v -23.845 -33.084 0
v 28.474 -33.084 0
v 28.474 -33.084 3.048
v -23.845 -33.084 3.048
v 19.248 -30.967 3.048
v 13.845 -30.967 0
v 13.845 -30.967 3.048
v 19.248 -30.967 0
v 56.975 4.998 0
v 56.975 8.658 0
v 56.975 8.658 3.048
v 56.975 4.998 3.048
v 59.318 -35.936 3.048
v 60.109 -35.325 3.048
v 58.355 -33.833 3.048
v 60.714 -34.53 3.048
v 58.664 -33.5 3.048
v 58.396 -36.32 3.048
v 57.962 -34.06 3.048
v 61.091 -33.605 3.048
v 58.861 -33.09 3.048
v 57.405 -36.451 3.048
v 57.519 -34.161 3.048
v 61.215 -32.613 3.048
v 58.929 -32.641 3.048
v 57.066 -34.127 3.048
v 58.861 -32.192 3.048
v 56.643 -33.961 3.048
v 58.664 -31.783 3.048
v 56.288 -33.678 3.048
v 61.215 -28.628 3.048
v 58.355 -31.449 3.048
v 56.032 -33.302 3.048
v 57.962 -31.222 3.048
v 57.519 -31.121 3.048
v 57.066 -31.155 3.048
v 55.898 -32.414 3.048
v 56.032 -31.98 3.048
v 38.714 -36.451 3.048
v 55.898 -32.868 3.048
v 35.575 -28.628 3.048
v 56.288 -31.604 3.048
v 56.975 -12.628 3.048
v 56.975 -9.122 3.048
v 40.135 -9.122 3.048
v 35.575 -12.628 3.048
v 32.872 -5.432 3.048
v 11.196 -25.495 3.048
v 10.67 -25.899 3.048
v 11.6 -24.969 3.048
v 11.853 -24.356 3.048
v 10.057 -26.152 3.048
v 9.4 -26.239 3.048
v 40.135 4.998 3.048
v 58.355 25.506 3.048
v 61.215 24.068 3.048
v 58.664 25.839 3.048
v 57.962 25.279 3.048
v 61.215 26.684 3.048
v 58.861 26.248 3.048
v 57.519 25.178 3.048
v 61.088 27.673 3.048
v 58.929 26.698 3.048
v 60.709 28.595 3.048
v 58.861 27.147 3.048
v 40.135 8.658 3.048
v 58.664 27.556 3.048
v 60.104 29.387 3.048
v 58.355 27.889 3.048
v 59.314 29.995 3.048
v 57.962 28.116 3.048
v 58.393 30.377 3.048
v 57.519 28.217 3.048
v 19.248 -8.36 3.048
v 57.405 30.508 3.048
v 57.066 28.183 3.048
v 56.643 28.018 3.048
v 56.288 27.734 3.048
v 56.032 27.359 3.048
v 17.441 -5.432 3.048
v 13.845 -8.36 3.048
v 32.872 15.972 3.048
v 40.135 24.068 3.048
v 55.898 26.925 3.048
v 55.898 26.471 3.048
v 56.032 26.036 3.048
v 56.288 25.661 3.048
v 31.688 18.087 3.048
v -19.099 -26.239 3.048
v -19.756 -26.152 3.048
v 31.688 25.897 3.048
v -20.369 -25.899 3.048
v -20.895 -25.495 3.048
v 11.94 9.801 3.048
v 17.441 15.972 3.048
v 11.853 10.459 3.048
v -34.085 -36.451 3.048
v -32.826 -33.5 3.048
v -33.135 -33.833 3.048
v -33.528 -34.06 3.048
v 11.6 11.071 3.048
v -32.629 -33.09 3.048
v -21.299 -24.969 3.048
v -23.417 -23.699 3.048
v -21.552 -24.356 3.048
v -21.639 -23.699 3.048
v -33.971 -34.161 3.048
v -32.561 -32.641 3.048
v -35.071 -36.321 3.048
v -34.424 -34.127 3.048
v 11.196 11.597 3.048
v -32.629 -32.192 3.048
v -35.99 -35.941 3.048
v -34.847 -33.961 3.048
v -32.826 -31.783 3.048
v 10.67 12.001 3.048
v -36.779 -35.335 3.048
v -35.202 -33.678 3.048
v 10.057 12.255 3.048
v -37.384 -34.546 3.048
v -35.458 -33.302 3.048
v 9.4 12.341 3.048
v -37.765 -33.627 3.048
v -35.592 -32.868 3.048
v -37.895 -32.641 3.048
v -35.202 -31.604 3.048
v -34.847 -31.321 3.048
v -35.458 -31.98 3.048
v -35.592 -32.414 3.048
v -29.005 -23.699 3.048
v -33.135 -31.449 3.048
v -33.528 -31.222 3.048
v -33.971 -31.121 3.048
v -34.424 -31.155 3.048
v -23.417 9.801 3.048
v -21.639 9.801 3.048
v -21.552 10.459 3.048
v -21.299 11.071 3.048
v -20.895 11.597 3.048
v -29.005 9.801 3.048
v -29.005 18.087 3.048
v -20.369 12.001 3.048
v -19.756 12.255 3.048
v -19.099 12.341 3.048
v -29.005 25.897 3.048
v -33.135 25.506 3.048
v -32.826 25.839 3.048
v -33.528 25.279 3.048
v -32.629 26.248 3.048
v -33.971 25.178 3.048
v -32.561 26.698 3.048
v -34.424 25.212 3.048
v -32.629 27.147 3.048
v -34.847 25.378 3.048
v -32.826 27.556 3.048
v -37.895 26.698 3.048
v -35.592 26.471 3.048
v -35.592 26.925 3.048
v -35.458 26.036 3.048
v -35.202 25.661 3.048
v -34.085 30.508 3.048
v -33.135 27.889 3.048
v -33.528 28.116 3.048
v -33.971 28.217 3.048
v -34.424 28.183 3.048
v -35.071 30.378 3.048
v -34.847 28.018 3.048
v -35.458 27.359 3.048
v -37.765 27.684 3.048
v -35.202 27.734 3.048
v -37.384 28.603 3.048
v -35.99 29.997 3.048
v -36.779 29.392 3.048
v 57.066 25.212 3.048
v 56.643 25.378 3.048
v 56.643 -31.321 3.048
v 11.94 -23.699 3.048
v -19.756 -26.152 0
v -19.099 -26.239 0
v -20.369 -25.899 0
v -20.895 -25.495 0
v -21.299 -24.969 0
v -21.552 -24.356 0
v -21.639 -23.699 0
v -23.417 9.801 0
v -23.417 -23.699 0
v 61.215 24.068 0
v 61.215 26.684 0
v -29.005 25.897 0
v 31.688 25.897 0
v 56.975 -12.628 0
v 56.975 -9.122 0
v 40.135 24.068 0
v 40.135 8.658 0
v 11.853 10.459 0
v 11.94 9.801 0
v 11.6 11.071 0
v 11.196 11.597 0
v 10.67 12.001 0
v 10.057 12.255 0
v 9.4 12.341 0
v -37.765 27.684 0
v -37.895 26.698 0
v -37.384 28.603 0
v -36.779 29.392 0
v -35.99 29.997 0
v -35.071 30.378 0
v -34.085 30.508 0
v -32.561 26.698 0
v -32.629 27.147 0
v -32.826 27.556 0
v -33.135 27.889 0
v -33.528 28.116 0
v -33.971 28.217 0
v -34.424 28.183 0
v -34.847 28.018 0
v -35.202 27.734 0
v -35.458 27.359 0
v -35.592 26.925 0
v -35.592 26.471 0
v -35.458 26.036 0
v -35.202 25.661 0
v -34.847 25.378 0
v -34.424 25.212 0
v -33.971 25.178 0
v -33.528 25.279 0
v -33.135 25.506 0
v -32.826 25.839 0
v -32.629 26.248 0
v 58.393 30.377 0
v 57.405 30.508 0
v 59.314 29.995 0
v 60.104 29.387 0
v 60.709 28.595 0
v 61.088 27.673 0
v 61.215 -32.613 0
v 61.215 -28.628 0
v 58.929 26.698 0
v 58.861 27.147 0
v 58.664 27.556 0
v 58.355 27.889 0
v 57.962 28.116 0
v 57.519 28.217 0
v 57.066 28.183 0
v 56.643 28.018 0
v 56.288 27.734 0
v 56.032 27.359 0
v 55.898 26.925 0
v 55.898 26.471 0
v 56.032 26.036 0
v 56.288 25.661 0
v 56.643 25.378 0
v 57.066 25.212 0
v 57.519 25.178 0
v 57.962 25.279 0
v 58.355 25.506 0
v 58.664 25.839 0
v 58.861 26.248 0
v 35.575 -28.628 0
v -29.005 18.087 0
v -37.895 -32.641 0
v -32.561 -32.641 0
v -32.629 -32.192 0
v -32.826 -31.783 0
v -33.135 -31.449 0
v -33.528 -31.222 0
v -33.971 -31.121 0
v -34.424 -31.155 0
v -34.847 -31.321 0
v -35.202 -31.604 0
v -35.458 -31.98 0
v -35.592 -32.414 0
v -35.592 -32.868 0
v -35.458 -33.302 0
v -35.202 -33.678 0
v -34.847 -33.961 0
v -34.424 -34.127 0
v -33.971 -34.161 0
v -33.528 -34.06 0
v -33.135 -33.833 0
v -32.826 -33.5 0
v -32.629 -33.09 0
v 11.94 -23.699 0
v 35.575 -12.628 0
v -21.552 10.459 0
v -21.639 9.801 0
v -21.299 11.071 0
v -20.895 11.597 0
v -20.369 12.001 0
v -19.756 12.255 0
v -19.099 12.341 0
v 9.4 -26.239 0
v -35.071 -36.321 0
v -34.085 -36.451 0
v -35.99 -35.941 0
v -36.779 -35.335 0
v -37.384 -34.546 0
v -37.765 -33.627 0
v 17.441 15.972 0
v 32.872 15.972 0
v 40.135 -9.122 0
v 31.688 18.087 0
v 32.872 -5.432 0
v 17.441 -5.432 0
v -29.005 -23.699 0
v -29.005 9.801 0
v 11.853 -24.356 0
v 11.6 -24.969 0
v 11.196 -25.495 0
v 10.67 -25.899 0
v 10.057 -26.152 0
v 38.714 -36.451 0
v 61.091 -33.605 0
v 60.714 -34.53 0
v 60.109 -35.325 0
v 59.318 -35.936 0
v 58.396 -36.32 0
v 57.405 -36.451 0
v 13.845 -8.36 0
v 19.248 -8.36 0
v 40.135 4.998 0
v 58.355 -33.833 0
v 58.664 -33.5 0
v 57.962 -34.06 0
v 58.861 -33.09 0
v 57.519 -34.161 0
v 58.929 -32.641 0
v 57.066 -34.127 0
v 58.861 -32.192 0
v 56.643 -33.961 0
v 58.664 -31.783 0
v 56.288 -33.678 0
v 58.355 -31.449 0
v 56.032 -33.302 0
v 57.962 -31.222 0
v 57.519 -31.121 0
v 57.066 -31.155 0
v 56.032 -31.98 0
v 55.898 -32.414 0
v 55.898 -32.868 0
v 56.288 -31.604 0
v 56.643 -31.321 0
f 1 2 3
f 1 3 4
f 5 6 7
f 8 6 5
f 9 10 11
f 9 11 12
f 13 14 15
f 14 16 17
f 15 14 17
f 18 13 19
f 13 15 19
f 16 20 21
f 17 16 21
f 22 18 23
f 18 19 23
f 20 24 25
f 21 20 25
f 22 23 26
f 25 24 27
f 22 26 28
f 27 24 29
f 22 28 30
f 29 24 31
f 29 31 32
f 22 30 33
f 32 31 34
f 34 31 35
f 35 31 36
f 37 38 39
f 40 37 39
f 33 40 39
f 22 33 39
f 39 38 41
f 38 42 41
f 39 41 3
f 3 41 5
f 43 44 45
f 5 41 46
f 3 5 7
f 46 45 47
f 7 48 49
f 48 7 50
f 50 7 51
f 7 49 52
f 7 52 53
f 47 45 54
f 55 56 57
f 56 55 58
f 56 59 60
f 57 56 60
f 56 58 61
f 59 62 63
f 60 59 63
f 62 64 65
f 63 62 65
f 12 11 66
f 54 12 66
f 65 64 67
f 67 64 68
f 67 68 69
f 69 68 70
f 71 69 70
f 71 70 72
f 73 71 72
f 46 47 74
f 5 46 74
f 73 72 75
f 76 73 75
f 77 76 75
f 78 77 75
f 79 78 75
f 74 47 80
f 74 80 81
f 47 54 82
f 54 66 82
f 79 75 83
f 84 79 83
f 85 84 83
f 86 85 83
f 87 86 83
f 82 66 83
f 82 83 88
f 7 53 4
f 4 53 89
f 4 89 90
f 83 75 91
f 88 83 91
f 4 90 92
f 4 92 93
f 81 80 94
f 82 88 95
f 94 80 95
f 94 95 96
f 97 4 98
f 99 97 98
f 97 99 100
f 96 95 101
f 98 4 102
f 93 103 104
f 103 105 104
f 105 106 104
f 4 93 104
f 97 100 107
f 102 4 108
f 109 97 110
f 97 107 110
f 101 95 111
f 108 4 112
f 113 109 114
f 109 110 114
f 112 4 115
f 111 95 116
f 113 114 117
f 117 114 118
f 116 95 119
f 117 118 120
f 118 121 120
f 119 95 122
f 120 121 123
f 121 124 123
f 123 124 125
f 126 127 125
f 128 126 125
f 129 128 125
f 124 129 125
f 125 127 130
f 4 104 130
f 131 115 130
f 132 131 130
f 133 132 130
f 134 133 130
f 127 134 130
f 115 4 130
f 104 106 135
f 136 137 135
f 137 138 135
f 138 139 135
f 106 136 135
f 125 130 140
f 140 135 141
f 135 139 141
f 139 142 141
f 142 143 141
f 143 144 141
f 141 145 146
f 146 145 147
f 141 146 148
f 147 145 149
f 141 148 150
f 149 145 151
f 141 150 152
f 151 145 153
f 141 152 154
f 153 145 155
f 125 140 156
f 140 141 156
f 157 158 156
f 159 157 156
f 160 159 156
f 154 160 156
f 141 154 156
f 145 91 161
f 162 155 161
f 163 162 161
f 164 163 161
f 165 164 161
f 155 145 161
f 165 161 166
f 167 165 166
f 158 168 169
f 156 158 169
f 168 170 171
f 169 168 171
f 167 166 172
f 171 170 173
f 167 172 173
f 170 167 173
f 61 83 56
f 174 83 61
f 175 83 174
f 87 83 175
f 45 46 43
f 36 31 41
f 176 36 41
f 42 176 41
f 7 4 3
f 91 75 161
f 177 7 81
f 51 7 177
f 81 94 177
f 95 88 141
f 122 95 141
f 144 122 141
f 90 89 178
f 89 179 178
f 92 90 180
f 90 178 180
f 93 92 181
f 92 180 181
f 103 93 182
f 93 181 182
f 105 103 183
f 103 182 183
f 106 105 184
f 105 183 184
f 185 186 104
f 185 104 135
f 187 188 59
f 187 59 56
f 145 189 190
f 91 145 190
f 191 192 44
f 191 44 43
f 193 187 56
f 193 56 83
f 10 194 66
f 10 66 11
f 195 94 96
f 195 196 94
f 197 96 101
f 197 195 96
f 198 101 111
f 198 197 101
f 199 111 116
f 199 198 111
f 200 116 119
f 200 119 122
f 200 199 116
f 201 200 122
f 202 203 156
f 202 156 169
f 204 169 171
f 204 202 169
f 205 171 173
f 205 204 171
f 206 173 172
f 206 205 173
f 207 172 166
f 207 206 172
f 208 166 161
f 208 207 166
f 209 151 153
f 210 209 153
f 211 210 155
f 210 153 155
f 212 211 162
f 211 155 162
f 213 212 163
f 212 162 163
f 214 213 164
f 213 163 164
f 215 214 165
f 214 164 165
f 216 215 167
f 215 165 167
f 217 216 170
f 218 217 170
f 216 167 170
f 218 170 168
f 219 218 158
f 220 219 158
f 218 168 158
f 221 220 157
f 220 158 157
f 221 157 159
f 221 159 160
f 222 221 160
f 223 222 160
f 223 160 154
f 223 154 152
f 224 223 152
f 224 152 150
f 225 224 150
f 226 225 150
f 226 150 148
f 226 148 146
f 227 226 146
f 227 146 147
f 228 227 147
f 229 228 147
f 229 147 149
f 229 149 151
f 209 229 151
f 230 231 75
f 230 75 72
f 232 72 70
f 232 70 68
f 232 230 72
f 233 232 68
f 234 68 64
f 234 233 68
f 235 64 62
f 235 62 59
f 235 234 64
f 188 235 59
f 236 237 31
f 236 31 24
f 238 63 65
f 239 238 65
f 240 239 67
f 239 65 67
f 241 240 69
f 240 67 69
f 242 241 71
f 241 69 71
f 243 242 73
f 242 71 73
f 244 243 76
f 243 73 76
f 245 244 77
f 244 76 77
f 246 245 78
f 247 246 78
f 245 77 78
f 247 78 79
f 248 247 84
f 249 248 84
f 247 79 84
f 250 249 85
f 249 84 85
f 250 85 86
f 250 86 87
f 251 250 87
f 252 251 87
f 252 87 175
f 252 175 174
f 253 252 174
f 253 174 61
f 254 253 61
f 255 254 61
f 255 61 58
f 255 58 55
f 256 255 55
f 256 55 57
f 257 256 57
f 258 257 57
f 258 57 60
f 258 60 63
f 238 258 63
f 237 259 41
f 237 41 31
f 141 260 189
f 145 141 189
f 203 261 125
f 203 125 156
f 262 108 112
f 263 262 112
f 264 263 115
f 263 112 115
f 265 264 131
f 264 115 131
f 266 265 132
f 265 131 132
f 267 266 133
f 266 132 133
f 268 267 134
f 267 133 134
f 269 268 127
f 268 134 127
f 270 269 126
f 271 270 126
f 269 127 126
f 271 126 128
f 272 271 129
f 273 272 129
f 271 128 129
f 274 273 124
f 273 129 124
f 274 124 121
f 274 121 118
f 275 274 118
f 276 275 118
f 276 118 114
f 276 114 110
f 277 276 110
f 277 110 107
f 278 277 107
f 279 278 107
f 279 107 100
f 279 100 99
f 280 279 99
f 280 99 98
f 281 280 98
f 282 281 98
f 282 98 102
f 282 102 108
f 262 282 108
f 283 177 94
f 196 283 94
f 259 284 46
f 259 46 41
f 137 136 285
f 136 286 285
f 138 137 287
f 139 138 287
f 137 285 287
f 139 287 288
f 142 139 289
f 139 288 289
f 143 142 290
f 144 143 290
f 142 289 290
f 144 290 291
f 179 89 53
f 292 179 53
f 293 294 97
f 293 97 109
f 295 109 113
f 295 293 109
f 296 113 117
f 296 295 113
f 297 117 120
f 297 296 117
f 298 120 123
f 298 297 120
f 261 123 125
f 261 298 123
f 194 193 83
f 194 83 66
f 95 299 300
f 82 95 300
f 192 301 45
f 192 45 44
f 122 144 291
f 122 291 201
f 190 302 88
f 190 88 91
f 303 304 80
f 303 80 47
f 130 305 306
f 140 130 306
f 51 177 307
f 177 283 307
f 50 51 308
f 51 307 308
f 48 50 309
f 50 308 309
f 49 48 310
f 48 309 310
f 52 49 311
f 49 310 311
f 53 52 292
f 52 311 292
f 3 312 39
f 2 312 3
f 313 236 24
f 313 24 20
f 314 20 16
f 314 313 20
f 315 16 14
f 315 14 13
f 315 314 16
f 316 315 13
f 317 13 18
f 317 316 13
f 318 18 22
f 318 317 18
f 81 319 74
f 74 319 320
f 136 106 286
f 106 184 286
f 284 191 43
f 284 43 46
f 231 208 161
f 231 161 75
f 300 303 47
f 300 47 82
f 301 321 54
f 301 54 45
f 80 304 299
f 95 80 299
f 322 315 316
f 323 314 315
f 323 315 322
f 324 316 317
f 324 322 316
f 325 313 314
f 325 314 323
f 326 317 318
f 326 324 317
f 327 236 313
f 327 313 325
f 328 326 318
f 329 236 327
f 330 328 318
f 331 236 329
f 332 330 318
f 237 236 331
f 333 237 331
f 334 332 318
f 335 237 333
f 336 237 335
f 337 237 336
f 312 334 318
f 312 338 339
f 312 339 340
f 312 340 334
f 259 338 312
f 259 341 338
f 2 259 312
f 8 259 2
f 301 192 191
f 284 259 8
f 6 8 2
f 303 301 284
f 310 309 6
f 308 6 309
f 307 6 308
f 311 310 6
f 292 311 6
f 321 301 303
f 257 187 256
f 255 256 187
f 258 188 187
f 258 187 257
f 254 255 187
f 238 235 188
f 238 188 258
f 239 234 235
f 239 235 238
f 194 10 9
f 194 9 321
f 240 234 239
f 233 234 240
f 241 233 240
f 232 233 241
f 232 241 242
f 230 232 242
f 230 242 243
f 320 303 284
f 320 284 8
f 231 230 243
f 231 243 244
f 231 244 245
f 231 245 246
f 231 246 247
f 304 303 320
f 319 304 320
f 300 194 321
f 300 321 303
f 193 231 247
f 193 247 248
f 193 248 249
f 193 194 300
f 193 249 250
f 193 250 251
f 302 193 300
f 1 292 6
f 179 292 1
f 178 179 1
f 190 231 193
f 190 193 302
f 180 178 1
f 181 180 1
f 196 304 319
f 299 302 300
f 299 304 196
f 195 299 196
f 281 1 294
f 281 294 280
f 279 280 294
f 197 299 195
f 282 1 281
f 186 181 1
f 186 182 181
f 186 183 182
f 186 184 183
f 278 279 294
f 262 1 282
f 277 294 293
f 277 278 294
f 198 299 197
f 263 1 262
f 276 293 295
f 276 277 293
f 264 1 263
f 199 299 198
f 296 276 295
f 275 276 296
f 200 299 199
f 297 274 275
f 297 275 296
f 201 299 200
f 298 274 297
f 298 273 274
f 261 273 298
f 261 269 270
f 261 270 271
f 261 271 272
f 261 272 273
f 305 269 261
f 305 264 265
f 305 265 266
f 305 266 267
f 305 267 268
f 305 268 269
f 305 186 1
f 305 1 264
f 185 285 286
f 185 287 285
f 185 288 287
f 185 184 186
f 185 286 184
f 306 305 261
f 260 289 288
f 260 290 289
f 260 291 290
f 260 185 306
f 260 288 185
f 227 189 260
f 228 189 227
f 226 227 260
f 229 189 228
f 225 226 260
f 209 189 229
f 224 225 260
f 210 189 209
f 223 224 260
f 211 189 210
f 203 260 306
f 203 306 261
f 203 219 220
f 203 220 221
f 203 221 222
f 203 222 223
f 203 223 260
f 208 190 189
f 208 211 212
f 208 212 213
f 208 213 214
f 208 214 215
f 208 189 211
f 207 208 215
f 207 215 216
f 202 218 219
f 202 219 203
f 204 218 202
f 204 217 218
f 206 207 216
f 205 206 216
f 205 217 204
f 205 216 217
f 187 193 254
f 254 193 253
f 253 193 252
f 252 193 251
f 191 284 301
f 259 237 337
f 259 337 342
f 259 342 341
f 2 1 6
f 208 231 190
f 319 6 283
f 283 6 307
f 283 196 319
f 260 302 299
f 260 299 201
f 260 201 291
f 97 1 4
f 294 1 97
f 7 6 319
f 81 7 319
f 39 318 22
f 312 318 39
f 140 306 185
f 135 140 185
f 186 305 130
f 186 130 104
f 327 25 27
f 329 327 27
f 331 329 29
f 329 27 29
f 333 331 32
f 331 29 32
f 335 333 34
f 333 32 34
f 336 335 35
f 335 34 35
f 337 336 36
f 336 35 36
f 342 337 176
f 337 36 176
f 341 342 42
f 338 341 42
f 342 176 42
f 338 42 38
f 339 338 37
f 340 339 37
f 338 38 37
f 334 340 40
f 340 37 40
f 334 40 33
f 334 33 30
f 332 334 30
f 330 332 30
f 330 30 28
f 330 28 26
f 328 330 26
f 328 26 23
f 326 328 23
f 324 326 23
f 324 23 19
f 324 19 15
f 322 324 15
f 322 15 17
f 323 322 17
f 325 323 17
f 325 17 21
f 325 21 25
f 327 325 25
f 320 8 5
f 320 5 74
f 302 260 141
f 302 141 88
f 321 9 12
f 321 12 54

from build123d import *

# Parameters (mm, degrees)
SKETCH1_R           = 1.3462
SKETCH1_W           = 5.4034
SKETCH1_H           = 22.6066
SKETCH1_W_2         = 60.6932
SKETCH1_H_2         = 7.81
SKETCH1_W_3         = 15.431
SKETCH1_H_3         = 21.4039
SKETCH1_W_4         = 31.9679
SKETCH1_H_4         = 18.2371
SKETCH1_W_5         = 5.588
SKETCH1_H_5         = 33.5001
BOSS_EXTRUDE1_DEPTH = 3.048
SKETCH2_W           = 33.5789
SKETCH2_H           = 38.5801
CUT_EXTRUDE1_DEPTH  = 4.048
FILLET1_R           = 2.54
SKETCH3_R           = 1.524
CUT_EXTRUDE2_DEPTH  = 4.048


with BuildPart() as part:
    # Sketch1 → Boss-Extrude1 (new body)
    with BuildSketch(Plane.XY):
        with BuildLine():
            Line((61.214907375, 24.068294304), (40.134807375, 24.068294304))
            Line((40.134807375, 24.068294304), (40.134807375, 8.658194304))
            Line((40.134807375, 8.658194304), (56.975007375, 8.658194304))
            Line((56.975007375, 8.658194304), (56.975007375, 4.997894304))
            Line((56.975007375, 4.997894304), (40.134807375, 4.997894304))
            Line((40.134807375, 4.997894304), (40.134807375, -9.121805696))
            Line((40.134807375, -9.121805696), (56.975007375, -9.121805696))
            Line((56.975007375, -9.121805696), (56.975007375, -12.628005696))
            Line((56.975007375, -12.628005696), (35.575007375, -12.628005696))
            Line((35.575007375, -12.628005696), (35.575007375, -28.627805696))
            Line((35.575007375, -28.627805696), (61.214907375, -28.627805696))
            Line((61.214907375, -28.627805696), (61.214907375, -32.613401529))
            ThreePointArc((61.214907375, -32.613401529), (60.108826144, -35.325305244), (57.405007375, -36.451005696))
            Line((57.405007375, -36.451005696), (38.714307375, -36.451005696))
            Line((38.714307375, -36.451005696), (28.474307375, -33.084405696))
            Line((28.474307375, -33.084405696), (-23.844892625, -33.084405696))
            Line((-23.844892625, -33.084405696), (-34.084892625, -36.451005696))
            ThreePointArc((-34.084892625, -36.451005696), (-36.778969461, -35.335082532), (-37.894892625, -32.641005696))
            Line((-37.894892625, -32.641005696), (-37.894892625, 26.697694304))
            ThreePointArc((-37.894892625, 26.697694304), (-36.778969461, 29.391771141), (-34.084892625, 30.507694304))
            Line((-34.084892625, 30.507694304), (57.404932375, 30.507694304))
            ThreePointArc((57.404932375, 30.507694304), (60.103884597, 29.386886916), (61.214907375, 26.683892153))
            Line((61.214907375, 26.683892153), (61.214907375, 24.068294304))
        make_face()
        with Locations((57.404932375, 26.697694304)):
            Circle(SKETCH1_R, mode=Mode.SUBTRACT)
        with Locations((57.405007375, -32.641005696)):
            Circle(SKETCH1_R, mode=Mode.SUBTRACT)
        with Locations((-34.084892625, -32.641005696)):
            Circle(SKETCH1_R, mode=Mode.SUBTRACT)
        with Locations((-34.084892625, 26.697694304)):
            Circle(SKETCH1_R, mode=Mode.SUBTRACT)
        with Locations((16.546707375, -19.663505696)):
            Rectangle(SKETCH1_W, SKETCH1_H, mode=Mode.SUBTRACT)
        with Locations((1.341707375, 21.991994304)):
            Rectangle(SKETCH1_W_2, SKETCH1_H_2, mode=Mode.SUBTRACT)
        with Locations((25.156507375, 5.270444304)):
            Rectangle(SKETCH1_W_3, SKETCH1_H_3, mode=Mode.SUBTRACT)
        with Locations((-5.654942625, 1.475544304)):
            Rectangle(SKETCH1_W_4, SKETCH1_H_4, mode=Mode.SUBTRACT)
        with Locations((-26.210892625, -6.948855696)):
            Rectangle(SKETCH1_W_5, SKETCH1_H_5, mode=Mode.SUBTRACT)
    extrude(amount=BOSS_EXTRUDE1_DEPTH)

    # Sketch2 → Cut-Extrude1 (cut, through all)
    with BuildSketch(Plane.XY.offset(3.048)):
        with Locations((-4.849442625, -6.948855696)):
            Rectangle(SKETCH2_W, SKETCH2_H)
    extrude(amount=-CUT_EXTRUDE1_DEPTH, mode=Mode.SUBTRACT)

    # Fillet1
    fillet1_edges = [part.edges().sort_by_distance(p)[0] for p in [
        (-21.638892625, -26.238905696, 1.524),
        (11.940007375, 12.341194304, 1.524),
        (11.940007375, -26.238905696, 1.524),
        (-21.638892625, 12.341194304, 1.524),
    ]]
    fillet(fillet1_edges, radius=FILLET1_R)

    # Sketch3 → Cut-Extrude2 (cut, through all)
    with BuildSketch(Plane.XY.offset(3.048)):
        with Locations((-34.084892625, 26.697694304)):
            Circle(SKETCH3_R)
        with Locations((57.404932375, 26.697694304)):
            Circle(SKETCH3_R)
        with Locations((57.405007375, -32.641005696)):
            Circle(SKETCH3_R)
        with Locations((-34.084892625, -32.641005696)):
            Circle(SKETCH3_R)
    extrude(amount=-CUT_EXTRUDE2_DEPTH, mode=Mode.SUBTRACT)


solid = part.part
